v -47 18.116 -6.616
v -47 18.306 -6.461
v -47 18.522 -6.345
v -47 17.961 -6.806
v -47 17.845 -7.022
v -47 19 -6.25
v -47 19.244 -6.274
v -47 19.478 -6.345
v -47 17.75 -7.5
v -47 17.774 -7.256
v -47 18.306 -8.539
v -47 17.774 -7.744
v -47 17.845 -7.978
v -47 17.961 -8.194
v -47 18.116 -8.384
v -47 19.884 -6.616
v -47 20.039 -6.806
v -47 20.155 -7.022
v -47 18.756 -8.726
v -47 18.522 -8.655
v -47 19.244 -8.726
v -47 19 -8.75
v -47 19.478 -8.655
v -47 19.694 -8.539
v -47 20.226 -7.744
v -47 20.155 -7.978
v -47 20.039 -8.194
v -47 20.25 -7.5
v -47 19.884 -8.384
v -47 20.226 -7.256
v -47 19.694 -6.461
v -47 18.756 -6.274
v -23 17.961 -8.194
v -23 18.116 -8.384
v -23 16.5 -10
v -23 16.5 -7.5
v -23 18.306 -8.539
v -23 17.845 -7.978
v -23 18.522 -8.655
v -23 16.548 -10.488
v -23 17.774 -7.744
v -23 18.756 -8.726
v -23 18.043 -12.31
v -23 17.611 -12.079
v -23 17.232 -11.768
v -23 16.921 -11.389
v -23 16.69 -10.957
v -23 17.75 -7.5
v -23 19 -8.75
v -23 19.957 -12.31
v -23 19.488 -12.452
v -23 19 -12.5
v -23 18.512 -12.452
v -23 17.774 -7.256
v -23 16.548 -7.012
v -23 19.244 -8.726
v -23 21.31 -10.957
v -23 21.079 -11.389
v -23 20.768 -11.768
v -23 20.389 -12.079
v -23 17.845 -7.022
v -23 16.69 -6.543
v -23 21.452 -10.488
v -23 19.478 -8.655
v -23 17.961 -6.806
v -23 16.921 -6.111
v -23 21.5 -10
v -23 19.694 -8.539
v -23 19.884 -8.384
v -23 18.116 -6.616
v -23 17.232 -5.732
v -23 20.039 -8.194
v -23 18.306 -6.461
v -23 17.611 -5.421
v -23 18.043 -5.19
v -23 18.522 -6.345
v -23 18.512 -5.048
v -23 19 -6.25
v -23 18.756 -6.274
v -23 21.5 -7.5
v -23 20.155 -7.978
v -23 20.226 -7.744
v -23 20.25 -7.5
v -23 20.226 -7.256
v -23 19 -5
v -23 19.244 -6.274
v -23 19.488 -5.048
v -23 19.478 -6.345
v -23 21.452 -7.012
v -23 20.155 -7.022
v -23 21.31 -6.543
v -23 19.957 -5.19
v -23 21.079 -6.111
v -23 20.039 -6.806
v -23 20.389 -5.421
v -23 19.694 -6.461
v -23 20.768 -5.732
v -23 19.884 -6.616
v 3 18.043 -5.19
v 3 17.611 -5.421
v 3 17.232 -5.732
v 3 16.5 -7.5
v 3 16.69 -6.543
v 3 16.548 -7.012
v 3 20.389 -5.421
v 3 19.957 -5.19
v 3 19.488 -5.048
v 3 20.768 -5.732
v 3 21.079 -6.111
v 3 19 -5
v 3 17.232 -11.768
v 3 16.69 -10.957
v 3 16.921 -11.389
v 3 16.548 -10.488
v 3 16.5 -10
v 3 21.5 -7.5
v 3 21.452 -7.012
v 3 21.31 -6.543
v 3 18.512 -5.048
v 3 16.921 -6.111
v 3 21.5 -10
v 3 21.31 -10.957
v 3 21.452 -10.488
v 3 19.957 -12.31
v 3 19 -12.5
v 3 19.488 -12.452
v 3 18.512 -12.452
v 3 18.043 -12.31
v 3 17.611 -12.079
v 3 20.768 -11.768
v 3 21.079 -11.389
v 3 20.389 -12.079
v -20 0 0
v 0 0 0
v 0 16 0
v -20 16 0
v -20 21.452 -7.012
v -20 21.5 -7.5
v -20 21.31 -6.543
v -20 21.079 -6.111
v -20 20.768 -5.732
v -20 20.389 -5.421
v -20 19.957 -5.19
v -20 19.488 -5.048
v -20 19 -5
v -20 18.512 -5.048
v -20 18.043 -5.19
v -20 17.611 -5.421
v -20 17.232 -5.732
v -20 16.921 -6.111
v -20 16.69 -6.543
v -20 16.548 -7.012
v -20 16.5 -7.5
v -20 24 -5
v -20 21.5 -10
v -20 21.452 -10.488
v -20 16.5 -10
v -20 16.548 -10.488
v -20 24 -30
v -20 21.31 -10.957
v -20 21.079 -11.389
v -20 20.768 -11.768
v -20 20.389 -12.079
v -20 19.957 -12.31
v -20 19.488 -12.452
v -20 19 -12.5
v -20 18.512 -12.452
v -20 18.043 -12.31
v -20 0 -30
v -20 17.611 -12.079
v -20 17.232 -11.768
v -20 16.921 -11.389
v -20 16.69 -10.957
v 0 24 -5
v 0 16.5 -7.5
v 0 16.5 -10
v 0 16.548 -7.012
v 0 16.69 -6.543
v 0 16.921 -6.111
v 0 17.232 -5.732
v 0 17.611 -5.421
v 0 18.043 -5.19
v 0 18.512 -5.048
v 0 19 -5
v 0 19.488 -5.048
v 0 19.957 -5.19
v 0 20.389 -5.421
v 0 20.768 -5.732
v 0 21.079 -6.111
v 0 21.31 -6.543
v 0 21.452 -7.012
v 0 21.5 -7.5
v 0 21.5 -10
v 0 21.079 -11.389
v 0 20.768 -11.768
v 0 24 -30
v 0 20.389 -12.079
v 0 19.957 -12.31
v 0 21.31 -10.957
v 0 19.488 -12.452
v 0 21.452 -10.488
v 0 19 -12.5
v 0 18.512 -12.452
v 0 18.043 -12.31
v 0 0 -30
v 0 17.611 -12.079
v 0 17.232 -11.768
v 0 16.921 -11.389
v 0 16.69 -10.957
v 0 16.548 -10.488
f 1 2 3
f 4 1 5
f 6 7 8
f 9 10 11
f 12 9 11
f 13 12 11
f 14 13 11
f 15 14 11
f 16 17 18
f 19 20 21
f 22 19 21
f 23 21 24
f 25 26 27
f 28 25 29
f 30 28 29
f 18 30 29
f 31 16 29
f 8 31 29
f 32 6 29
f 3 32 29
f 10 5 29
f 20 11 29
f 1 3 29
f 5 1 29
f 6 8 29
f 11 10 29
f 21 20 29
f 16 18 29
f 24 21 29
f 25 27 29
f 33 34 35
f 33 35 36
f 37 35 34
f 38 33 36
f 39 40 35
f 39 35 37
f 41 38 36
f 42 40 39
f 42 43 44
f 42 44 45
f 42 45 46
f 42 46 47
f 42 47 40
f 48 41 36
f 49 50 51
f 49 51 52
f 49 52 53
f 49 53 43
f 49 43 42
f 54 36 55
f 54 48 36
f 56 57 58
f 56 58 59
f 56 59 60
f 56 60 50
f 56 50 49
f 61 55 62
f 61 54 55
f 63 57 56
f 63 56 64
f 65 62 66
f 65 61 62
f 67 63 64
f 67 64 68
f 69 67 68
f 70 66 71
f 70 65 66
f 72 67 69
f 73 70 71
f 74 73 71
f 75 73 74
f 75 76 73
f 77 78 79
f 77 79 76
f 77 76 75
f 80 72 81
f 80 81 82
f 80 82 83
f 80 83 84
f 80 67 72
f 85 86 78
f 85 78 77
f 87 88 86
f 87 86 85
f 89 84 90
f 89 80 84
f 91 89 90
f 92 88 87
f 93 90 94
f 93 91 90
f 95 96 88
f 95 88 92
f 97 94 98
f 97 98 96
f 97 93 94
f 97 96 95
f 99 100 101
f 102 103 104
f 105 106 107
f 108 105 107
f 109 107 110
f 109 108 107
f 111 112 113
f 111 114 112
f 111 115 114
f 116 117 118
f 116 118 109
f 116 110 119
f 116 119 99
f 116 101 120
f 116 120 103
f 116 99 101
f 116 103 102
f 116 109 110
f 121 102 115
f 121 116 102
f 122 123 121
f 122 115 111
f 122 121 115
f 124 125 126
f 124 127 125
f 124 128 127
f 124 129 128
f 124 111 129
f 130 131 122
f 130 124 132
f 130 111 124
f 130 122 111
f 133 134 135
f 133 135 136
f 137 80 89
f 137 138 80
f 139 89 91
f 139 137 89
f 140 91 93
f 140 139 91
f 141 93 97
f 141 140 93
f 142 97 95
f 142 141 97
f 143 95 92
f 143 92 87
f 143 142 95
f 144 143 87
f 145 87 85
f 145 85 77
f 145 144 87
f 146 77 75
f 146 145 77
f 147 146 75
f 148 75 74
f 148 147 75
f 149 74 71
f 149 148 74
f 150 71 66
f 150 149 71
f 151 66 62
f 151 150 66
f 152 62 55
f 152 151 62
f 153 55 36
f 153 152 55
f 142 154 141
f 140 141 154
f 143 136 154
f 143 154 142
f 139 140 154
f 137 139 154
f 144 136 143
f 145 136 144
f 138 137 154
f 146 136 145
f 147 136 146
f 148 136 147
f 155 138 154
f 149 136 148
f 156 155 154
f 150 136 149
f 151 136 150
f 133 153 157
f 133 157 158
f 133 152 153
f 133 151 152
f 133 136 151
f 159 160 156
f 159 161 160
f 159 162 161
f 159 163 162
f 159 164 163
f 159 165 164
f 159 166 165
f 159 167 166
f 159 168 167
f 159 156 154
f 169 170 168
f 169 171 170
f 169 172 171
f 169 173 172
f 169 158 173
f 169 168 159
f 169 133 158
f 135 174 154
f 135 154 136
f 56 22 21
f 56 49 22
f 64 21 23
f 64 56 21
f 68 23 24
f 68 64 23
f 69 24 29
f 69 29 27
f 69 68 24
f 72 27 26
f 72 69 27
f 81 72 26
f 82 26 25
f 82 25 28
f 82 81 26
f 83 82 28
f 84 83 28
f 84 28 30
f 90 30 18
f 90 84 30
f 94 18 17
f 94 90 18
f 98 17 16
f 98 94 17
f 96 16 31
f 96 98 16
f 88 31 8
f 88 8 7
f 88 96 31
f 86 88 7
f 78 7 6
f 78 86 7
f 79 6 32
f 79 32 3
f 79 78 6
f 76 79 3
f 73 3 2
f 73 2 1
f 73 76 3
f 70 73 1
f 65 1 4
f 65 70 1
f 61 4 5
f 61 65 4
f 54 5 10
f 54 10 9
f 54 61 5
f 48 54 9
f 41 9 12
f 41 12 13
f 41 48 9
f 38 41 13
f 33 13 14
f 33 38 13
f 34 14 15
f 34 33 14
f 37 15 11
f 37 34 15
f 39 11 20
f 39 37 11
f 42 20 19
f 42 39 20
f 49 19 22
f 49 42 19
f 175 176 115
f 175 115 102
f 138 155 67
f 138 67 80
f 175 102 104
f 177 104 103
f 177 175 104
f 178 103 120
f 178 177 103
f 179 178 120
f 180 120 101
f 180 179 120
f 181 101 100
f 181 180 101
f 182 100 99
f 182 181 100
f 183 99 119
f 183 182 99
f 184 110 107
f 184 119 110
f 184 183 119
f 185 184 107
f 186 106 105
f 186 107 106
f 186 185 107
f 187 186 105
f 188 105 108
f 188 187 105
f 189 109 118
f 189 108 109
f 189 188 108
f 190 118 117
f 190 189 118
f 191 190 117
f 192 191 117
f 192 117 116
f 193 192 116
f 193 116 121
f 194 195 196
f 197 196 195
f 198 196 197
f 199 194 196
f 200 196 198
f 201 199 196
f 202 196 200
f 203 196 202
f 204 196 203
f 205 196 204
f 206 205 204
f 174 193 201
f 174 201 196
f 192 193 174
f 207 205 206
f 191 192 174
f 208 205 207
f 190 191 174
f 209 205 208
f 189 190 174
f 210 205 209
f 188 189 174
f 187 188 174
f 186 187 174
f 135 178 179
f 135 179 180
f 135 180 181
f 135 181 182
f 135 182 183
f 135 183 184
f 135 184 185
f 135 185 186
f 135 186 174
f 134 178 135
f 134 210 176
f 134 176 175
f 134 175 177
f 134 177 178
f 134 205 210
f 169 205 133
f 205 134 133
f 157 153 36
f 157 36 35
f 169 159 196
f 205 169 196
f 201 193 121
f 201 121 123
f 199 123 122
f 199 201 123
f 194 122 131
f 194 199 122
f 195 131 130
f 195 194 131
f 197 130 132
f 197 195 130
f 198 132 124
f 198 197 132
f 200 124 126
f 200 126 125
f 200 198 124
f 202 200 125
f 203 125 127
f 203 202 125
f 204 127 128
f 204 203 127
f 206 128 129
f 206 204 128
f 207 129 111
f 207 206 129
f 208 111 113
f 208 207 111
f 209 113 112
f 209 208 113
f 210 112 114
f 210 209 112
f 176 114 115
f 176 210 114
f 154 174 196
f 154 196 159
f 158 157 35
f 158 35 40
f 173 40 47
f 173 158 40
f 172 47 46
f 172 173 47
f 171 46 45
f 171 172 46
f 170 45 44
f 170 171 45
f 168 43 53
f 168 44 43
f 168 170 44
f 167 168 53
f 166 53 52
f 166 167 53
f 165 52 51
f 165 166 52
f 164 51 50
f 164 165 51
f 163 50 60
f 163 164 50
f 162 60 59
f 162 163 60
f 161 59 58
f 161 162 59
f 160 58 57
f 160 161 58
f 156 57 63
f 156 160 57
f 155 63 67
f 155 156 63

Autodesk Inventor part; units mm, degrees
ref_plane "YZ Plane" through (0, 0, 0) normal (1, 0, 0) x (0, 1, 0)
ref_plane "XZ Plane" through (0, 0, 0) normal (0, 1, 0) x (-1, 0, 0)
sketch "スケッチ1" plane through (0, 0, 0) normal (0, 1, 0) x (-1, 0, 0)
  line L0 (0, 0) -> (20, 0)
  line L1 (20, 0) -> (20, -30)
  line L2 (20, -30) -> (0, -30)
  line L3 (0, -30) -> (0, 0)
  dimension "d0" = 20
  dimension "d1" = 30
extrude "押し出し1" add sketch "スケッチ1" along normal blind 24
sketch "スケッチ2" plane through (0, 0, 0) normal (1, 0, 0) x (0, 0, -1)
  line L0 (0, 0) -> (0, 24) projected
  line L1 (0, 16) -> (0, 24)
  line L2 (0, 24) -> (5, 24)
  line L3 (5, 24) -> (0, 16)
  dimension "d4" = 5
  dimension "d5" = 8
extrude "押し出し2" cut sketch "スケッチ2" against normal through all
sketch "スケッチ3" plane through (-20, 0, -30) normal (-1, 0, 0) x (0, 0, 1)
  circle A0 centre (22.5, 19) radius 2.5
  line L0 (30, 0) -> (30, 16) projected
  line L1 (0, 24) -> (25, 24) projected
  circle A1 centre (20, 19) radius 2.5
  line L2 (17.5, 21.5) -> (25, 21.5)
  line L3 (25, 21.5) -> (25, 16.5) construction
  line L4 (25, 16.5) -> (17.5, 16.5)
  line L5 (17.5, 16.5) -> (17.5, 21.5) construction
  point P0 (22.5, 21.5)
  point P1 (20, 21.5)
  point P2 (20, 16.5)
  point P3 (22.5, 16.5)
  dimension "d8" = 5
  dimension "d9" = 7.5
  dimension "d10" = 5
  dimension "d11" = 5
  dimension "d12" = 7.5
extrude "押し出し3" add sketch "スケッチ3" along normal blind 3
ref_plane "作業平面1" through (-10, 0, -30) normal (-1, 0, 0) x (0, 0, 1)
mirror "ミラー1" about plane through (-10, 0, -30) normal (-1, 0, 0) of "押し出し3"
sketch "スケッチ4" plane through (3, 19, -10) normal (1, 0, 0) x (0, 0, -1)
  arc A0 (-2.5, 2.5) -> (-2.5, -2.5) centre (-2.5, 0) ccw projected
  circle A1 centre (-2.5, 0) radius 1.25
  point P0 (-10, -19)
  dimension "d16" = 2.5
extrude "押し出し4" add sketch "スケッチ4" against normal blind 50
properties part number "Motor"
